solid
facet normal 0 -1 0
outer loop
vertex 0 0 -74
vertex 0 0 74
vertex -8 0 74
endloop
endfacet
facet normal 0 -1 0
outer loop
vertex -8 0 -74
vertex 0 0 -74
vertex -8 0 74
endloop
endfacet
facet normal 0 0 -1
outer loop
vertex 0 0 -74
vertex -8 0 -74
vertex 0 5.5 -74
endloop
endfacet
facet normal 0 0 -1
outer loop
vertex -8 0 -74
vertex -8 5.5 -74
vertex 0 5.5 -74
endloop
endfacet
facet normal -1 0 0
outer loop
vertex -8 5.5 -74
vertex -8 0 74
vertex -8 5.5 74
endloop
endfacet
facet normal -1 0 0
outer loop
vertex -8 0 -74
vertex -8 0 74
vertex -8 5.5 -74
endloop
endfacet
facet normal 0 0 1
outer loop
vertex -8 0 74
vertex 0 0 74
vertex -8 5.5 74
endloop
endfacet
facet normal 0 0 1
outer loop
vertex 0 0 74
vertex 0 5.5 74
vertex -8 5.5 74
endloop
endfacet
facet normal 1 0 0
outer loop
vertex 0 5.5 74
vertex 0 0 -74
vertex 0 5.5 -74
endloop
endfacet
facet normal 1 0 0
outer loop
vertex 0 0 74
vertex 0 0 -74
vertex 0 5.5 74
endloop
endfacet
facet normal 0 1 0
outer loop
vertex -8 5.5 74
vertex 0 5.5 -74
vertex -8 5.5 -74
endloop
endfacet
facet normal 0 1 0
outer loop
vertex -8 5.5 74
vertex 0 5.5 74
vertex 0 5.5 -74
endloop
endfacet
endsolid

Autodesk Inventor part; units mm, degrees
ref_plane "YZ Plane" through (0, 0, 0) normal (1, 0, 0) x (0, 1, 0)
ref_plane "XZ Plane" through (0, 0, 0) normal (0, 1, 0) x (-1, 0, 0)
ref_plane "XY Plane" through (0, 0, 0) normal (0, 0, 1) x (1, 0, 0)
sketch "スケッチ1" plane through (0, 0, 0) normal (0, 1, 0) x (-1, 0, 0)
  line L0 (0, 99) -> (8, 99)
  line L1 (8, 99) -> (8, -99)
  line L2 (8, -99) -> (0, -99)
  line L3 (0, -99) -> (0, 99)
  point P0 (0, 0)
  point P1 (0, 0)
  dimension "d0" = 198
  dimension "d1" = 8
extrude "押し出し1" add sketch "スケッチ1" along normal blind 5.5
sketch "スケッチ2" plane through (0, 5.5, 0) normal (0, 1, 0) x (1, 0, 0)
  line L0 (-8, 99) -> (-8, -99) projected
  line L1 (-8, -99) -> (0, -99)
  line L2 (0, -99) -> (0, -74)
  line L3 (0, -74) -> (-8, -74)
  line L4 (-8, -74) -> (-8, -99)
  line L5 (0, -99) -> (0, 98.6733)
  point P0 (0, 0)
  point P1 (-8, -74)
  dimension "d4" = 25
  dimension "d7" = 8
extrude "押し出し2" cut sketch "スケッチ2" against normal through all
mirror "ミラー1" about plane through (0, 0, 0) normal (0, 0, 1) of "押し出し2"
properties part number "back_upper" material "木材 (カエデ材)"
